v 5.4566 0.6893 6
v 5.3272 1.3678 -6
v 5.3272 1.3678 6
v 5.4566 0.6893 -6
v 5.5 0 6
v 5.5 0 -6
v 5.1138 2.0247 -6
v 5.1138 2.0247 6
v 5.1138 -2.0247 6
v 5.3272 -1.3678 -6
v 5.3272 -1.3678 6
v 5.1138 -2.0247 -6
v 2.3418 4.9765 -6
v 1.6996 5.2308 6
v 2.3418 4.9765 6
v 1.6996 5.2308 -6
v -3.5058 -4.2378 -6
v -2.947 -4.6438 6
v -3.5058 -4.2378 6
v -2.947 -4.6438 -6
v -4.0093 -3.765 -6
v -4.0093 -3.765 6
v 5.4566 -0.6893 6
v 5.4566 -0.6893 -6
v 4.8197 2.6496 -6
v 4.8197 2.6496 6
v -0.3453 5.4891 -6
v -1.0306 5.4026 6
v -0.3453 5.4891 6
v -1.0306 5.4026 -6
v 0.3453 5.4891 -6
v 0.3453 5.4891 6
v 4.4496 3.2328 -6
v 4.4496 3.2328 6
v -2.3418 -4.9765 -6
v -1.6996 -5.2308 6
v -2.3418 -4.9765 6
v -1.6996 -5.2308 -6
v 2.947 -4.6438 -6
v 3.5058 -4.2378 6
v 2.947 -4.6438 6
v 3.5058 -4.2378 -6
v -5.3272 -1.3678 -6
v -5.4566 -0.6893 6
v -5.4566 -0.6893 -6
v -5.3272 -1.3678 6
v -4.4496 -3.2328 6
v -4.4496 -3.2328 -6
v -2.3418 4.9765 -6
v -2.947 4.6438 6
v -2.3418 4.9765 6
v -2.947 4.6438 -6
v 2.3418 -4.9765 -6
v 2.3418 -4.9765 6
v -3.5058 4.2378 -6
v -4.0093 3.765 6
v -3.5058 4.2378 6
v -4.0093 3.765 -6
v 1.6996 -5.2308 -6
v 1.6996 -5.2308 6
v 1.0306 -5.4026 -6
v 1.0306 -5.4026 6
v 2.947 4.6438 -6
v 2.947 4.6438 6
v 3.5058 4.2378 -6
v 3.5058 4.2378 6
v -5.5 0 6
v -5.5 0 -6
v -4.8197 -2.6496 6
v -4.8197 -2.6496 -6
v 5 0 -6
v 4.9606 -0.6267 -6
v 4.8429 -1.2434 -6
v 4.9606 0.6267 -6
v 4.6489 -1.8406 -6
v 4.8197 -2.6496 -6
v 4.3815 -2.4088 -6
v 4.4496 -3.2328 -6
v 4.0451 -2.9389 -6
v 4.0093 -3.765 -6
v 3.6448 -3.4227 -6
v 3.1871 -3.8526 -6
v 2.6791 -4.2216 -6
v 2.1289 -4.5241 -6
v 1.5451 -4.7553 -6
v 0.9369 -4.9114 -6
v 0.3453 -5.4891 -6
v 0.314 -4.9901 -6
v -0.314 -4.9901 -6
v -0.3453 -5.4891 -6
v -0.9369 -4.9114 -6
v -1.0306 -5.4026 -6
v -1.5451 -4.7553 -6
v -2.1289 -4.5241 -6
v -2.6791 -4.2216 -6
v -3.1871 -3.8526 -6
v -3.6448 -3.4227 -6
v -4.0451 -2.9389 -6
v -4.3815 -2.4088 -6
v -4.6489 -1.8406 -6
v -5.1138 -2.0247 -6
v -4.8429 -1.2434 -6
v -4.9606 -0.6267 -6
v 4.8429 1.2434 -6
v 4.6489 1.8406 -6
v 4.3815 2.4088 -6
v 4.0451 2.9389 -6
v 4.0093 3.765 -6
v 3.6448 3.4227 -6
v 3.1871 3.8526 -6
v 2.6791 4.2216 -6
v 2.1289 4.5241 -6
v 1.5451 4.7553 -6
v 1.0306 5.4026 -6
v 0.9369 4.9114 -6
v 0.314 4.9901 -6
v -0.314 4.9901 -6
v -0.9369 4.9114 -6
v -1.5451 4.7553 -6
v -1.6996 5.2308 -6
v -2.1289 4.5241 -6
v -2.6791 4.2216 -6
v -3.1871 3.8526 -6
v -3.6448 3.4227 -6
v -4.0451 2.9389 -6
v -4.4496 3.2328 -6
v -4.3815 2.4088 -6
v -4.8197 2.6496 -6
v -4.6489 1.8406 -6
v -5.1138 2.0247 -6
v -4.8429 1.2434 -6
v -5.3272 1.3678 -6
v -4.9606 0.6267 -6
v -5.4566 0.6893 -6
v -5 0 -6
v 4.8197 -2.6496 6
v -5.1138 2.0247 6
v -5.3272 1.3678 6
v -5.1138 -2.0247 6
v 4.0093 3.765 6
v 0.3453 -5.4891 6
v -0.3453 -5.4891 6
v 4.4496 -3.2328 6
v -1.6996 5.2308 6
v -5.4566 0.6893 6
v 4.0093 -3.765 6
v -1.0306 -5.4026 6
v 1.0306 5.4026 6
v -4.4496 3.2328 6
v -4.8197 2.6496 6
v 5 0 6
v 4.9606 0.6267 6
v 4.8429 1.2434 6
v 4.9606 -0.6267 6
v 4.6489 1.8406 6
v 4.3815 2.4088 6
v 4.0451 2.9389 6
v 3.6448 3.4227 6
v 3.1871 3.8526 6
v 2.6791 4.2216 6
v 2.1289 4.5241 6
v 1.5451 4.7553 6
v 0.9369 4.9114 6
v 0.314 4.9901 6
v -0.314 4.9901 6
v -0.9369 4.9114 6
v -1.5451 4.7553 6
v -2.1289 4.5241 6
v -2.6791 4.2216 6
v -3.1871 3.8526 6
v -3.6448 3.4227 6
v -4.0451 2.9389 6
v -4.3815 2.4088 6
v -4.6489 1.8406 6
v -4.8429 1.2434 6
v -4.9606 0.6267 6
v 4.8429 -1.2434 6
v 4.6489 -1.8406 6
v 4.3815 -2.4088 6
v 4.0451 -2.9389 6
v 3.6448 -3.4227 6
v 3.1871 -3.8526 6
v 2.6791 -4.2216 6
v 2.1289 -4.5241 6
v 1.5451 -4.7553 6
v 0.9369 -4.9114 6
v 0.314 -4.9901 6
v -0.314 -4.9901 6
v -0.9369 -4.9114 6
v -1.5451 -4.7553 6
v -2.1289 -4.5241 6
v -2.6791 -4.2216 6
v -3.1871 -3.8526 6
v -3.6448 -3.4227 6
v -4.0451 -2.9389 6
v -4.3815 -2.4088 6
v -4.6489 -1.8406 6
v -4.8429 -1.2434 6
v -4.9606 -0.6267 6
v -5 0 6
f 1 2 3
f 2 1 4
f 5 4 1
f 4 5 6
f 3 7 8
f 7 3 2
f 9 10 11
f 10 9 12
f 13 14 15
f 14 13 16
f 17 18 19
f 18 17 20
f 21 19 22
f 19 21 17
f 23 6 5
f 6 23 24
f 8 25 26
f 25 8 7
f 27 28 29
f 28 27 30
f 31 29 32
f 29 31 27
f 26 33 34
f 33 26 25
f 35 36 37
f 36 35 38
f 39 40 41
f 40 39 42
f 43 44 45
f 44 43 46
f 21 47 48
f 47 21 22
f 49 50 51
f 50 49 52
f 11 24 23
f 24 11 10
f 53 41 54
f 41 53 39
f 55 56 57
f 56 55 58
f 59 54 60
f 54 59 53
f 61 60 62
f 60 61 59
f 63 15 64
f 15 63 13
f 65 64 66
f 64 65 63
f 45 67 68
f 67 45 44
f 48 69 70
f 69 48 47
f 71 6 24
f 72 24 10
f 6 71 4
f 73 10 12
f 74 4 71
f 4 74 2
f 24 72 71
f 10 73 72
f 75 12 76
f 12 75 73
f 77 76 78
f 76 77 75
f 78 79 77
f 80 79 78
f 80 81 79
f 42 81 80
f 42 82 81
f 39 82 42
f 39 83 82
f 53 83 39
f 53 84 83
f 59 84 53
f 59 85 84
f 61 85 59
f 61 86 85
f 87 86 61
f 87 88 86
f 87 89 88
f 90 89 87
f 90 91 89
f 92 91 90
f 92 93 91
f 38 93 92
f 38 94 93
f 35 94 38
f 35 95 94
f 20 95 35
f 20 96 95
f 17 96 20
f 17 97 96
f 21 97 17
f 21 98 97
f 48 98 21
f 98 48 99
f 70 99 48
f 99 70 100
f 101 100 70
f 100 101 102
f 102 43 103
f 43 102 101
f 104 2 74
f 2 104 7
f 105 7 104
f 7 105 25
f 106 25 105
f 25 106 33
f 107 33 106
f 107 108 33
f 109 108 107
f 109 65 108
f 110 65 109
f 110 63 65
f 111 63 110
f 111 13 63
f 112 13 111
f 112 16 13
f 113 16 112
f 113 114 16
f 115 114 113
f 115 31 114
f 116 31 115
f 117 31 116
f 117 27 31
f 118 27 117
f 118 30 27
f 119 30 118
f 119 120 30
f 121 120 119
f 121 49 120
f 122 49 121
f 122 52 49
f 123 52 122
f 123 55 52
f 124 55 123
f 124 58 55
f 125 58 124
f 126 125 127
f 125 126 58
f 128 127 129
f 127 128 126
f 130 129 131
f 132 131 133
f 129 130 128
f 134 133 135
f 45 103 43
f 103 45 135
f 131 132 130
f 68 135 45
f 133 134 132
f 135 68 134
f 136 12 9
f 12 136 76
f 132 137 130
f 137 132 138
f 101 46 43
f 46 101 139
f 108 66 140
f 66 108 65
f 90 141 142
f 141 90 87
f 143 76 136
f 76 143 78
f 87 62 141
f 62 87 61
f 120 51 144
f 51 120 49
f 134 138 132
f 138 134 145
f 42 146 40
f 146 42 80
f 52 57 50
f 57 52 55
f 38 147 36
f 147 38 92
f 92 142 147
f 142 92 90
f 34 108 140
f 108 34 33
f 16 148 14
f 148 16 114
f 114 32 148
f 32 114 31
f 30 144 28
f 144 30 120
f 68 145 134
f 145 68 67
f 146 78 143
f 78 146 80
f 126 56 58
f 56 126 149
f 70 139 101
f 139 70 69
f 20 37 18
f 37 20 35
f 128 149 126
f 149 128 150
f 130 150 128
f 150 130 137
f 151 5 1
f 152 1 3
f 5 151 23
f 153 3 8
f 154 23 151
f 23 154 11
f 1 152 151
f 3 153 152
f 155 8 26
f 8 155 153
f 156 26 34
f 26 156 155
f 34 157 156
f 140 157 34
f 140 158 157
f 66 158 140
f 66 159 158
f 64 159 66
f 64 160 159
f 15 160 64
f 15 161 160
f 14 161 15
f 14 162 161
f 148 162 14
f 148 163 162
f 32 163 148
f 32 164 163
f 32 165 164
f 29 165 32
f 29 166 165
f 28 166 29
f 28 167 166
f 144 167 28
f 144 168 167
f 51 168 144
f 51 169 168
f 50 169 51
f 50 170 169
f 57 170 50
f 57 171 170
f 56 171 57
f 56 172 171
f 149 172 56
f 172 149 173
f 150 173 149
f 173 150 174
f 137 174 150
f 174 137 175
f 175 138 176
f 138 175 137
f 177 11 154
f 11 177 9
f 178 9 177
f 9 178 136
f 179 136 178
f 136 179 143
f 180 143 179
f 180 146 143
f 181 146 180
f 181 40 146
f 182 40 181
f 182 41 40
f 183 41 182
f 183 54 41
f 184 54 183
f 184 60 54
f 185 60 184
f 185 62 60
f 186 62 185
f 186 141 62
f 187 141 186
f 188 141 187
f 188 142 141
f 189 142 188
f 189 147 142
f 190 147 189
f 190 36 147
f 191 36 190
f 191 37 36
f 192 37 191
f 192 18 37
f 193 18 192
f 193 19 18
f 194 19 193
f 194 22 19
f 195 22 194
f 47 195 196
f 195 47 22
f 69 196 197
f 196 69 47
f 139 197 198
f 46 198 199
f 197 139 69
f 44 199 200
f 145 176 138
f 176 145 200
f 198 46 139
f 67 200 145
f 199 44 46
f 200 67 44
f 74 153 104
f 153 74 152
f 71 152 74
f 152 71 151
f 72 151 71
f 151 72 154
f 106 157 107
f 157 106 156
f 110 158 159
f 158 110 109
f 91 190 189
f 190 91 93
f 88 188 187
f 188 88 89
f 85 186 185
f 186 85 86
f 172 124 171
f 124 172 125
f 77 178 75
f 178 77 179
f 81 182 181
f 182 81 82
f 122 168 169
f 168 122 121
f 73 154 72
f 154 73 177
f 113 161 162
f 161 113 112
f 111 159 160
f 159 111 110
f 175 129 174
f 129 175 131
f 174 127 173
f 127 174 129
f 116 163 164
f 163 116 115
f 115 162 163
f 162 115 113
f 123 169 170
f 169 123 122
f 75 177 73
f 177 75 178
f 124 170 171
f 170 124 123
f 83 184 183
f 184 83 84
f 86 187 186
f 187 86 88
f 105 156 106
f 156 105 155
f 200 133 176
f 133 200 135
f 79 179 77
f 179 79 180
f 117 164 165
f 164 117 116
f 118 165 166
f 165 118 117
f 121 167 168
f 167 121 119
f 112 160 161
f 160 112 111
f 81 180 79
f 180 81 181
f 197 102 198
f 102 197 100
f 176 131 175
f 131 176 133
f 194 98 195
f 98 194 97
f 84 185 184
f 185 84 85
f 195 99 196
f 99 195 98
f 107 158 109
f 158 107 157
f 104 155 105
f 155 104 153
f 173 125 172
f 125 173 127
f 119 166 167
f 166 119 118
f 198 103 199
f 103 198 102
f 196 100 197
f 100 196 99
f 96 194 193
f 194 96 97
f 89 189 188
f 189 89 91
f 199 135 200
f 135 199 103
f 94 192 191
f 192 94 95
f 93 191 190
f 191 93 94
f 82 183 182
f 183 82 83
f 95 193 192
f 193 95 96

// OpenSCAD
$fn = 50;


difference() {
	union() {
		translate(v = [0, 0, -6.0000000000]) {
			cylinder(h = 12, r = 5.5000000000);
		}
	}
	union() {
		translate(v = [0, 0, -100.0000000000]) {
			cylinder(h = 200, r = 5.0000000000);
		}
	}
}
